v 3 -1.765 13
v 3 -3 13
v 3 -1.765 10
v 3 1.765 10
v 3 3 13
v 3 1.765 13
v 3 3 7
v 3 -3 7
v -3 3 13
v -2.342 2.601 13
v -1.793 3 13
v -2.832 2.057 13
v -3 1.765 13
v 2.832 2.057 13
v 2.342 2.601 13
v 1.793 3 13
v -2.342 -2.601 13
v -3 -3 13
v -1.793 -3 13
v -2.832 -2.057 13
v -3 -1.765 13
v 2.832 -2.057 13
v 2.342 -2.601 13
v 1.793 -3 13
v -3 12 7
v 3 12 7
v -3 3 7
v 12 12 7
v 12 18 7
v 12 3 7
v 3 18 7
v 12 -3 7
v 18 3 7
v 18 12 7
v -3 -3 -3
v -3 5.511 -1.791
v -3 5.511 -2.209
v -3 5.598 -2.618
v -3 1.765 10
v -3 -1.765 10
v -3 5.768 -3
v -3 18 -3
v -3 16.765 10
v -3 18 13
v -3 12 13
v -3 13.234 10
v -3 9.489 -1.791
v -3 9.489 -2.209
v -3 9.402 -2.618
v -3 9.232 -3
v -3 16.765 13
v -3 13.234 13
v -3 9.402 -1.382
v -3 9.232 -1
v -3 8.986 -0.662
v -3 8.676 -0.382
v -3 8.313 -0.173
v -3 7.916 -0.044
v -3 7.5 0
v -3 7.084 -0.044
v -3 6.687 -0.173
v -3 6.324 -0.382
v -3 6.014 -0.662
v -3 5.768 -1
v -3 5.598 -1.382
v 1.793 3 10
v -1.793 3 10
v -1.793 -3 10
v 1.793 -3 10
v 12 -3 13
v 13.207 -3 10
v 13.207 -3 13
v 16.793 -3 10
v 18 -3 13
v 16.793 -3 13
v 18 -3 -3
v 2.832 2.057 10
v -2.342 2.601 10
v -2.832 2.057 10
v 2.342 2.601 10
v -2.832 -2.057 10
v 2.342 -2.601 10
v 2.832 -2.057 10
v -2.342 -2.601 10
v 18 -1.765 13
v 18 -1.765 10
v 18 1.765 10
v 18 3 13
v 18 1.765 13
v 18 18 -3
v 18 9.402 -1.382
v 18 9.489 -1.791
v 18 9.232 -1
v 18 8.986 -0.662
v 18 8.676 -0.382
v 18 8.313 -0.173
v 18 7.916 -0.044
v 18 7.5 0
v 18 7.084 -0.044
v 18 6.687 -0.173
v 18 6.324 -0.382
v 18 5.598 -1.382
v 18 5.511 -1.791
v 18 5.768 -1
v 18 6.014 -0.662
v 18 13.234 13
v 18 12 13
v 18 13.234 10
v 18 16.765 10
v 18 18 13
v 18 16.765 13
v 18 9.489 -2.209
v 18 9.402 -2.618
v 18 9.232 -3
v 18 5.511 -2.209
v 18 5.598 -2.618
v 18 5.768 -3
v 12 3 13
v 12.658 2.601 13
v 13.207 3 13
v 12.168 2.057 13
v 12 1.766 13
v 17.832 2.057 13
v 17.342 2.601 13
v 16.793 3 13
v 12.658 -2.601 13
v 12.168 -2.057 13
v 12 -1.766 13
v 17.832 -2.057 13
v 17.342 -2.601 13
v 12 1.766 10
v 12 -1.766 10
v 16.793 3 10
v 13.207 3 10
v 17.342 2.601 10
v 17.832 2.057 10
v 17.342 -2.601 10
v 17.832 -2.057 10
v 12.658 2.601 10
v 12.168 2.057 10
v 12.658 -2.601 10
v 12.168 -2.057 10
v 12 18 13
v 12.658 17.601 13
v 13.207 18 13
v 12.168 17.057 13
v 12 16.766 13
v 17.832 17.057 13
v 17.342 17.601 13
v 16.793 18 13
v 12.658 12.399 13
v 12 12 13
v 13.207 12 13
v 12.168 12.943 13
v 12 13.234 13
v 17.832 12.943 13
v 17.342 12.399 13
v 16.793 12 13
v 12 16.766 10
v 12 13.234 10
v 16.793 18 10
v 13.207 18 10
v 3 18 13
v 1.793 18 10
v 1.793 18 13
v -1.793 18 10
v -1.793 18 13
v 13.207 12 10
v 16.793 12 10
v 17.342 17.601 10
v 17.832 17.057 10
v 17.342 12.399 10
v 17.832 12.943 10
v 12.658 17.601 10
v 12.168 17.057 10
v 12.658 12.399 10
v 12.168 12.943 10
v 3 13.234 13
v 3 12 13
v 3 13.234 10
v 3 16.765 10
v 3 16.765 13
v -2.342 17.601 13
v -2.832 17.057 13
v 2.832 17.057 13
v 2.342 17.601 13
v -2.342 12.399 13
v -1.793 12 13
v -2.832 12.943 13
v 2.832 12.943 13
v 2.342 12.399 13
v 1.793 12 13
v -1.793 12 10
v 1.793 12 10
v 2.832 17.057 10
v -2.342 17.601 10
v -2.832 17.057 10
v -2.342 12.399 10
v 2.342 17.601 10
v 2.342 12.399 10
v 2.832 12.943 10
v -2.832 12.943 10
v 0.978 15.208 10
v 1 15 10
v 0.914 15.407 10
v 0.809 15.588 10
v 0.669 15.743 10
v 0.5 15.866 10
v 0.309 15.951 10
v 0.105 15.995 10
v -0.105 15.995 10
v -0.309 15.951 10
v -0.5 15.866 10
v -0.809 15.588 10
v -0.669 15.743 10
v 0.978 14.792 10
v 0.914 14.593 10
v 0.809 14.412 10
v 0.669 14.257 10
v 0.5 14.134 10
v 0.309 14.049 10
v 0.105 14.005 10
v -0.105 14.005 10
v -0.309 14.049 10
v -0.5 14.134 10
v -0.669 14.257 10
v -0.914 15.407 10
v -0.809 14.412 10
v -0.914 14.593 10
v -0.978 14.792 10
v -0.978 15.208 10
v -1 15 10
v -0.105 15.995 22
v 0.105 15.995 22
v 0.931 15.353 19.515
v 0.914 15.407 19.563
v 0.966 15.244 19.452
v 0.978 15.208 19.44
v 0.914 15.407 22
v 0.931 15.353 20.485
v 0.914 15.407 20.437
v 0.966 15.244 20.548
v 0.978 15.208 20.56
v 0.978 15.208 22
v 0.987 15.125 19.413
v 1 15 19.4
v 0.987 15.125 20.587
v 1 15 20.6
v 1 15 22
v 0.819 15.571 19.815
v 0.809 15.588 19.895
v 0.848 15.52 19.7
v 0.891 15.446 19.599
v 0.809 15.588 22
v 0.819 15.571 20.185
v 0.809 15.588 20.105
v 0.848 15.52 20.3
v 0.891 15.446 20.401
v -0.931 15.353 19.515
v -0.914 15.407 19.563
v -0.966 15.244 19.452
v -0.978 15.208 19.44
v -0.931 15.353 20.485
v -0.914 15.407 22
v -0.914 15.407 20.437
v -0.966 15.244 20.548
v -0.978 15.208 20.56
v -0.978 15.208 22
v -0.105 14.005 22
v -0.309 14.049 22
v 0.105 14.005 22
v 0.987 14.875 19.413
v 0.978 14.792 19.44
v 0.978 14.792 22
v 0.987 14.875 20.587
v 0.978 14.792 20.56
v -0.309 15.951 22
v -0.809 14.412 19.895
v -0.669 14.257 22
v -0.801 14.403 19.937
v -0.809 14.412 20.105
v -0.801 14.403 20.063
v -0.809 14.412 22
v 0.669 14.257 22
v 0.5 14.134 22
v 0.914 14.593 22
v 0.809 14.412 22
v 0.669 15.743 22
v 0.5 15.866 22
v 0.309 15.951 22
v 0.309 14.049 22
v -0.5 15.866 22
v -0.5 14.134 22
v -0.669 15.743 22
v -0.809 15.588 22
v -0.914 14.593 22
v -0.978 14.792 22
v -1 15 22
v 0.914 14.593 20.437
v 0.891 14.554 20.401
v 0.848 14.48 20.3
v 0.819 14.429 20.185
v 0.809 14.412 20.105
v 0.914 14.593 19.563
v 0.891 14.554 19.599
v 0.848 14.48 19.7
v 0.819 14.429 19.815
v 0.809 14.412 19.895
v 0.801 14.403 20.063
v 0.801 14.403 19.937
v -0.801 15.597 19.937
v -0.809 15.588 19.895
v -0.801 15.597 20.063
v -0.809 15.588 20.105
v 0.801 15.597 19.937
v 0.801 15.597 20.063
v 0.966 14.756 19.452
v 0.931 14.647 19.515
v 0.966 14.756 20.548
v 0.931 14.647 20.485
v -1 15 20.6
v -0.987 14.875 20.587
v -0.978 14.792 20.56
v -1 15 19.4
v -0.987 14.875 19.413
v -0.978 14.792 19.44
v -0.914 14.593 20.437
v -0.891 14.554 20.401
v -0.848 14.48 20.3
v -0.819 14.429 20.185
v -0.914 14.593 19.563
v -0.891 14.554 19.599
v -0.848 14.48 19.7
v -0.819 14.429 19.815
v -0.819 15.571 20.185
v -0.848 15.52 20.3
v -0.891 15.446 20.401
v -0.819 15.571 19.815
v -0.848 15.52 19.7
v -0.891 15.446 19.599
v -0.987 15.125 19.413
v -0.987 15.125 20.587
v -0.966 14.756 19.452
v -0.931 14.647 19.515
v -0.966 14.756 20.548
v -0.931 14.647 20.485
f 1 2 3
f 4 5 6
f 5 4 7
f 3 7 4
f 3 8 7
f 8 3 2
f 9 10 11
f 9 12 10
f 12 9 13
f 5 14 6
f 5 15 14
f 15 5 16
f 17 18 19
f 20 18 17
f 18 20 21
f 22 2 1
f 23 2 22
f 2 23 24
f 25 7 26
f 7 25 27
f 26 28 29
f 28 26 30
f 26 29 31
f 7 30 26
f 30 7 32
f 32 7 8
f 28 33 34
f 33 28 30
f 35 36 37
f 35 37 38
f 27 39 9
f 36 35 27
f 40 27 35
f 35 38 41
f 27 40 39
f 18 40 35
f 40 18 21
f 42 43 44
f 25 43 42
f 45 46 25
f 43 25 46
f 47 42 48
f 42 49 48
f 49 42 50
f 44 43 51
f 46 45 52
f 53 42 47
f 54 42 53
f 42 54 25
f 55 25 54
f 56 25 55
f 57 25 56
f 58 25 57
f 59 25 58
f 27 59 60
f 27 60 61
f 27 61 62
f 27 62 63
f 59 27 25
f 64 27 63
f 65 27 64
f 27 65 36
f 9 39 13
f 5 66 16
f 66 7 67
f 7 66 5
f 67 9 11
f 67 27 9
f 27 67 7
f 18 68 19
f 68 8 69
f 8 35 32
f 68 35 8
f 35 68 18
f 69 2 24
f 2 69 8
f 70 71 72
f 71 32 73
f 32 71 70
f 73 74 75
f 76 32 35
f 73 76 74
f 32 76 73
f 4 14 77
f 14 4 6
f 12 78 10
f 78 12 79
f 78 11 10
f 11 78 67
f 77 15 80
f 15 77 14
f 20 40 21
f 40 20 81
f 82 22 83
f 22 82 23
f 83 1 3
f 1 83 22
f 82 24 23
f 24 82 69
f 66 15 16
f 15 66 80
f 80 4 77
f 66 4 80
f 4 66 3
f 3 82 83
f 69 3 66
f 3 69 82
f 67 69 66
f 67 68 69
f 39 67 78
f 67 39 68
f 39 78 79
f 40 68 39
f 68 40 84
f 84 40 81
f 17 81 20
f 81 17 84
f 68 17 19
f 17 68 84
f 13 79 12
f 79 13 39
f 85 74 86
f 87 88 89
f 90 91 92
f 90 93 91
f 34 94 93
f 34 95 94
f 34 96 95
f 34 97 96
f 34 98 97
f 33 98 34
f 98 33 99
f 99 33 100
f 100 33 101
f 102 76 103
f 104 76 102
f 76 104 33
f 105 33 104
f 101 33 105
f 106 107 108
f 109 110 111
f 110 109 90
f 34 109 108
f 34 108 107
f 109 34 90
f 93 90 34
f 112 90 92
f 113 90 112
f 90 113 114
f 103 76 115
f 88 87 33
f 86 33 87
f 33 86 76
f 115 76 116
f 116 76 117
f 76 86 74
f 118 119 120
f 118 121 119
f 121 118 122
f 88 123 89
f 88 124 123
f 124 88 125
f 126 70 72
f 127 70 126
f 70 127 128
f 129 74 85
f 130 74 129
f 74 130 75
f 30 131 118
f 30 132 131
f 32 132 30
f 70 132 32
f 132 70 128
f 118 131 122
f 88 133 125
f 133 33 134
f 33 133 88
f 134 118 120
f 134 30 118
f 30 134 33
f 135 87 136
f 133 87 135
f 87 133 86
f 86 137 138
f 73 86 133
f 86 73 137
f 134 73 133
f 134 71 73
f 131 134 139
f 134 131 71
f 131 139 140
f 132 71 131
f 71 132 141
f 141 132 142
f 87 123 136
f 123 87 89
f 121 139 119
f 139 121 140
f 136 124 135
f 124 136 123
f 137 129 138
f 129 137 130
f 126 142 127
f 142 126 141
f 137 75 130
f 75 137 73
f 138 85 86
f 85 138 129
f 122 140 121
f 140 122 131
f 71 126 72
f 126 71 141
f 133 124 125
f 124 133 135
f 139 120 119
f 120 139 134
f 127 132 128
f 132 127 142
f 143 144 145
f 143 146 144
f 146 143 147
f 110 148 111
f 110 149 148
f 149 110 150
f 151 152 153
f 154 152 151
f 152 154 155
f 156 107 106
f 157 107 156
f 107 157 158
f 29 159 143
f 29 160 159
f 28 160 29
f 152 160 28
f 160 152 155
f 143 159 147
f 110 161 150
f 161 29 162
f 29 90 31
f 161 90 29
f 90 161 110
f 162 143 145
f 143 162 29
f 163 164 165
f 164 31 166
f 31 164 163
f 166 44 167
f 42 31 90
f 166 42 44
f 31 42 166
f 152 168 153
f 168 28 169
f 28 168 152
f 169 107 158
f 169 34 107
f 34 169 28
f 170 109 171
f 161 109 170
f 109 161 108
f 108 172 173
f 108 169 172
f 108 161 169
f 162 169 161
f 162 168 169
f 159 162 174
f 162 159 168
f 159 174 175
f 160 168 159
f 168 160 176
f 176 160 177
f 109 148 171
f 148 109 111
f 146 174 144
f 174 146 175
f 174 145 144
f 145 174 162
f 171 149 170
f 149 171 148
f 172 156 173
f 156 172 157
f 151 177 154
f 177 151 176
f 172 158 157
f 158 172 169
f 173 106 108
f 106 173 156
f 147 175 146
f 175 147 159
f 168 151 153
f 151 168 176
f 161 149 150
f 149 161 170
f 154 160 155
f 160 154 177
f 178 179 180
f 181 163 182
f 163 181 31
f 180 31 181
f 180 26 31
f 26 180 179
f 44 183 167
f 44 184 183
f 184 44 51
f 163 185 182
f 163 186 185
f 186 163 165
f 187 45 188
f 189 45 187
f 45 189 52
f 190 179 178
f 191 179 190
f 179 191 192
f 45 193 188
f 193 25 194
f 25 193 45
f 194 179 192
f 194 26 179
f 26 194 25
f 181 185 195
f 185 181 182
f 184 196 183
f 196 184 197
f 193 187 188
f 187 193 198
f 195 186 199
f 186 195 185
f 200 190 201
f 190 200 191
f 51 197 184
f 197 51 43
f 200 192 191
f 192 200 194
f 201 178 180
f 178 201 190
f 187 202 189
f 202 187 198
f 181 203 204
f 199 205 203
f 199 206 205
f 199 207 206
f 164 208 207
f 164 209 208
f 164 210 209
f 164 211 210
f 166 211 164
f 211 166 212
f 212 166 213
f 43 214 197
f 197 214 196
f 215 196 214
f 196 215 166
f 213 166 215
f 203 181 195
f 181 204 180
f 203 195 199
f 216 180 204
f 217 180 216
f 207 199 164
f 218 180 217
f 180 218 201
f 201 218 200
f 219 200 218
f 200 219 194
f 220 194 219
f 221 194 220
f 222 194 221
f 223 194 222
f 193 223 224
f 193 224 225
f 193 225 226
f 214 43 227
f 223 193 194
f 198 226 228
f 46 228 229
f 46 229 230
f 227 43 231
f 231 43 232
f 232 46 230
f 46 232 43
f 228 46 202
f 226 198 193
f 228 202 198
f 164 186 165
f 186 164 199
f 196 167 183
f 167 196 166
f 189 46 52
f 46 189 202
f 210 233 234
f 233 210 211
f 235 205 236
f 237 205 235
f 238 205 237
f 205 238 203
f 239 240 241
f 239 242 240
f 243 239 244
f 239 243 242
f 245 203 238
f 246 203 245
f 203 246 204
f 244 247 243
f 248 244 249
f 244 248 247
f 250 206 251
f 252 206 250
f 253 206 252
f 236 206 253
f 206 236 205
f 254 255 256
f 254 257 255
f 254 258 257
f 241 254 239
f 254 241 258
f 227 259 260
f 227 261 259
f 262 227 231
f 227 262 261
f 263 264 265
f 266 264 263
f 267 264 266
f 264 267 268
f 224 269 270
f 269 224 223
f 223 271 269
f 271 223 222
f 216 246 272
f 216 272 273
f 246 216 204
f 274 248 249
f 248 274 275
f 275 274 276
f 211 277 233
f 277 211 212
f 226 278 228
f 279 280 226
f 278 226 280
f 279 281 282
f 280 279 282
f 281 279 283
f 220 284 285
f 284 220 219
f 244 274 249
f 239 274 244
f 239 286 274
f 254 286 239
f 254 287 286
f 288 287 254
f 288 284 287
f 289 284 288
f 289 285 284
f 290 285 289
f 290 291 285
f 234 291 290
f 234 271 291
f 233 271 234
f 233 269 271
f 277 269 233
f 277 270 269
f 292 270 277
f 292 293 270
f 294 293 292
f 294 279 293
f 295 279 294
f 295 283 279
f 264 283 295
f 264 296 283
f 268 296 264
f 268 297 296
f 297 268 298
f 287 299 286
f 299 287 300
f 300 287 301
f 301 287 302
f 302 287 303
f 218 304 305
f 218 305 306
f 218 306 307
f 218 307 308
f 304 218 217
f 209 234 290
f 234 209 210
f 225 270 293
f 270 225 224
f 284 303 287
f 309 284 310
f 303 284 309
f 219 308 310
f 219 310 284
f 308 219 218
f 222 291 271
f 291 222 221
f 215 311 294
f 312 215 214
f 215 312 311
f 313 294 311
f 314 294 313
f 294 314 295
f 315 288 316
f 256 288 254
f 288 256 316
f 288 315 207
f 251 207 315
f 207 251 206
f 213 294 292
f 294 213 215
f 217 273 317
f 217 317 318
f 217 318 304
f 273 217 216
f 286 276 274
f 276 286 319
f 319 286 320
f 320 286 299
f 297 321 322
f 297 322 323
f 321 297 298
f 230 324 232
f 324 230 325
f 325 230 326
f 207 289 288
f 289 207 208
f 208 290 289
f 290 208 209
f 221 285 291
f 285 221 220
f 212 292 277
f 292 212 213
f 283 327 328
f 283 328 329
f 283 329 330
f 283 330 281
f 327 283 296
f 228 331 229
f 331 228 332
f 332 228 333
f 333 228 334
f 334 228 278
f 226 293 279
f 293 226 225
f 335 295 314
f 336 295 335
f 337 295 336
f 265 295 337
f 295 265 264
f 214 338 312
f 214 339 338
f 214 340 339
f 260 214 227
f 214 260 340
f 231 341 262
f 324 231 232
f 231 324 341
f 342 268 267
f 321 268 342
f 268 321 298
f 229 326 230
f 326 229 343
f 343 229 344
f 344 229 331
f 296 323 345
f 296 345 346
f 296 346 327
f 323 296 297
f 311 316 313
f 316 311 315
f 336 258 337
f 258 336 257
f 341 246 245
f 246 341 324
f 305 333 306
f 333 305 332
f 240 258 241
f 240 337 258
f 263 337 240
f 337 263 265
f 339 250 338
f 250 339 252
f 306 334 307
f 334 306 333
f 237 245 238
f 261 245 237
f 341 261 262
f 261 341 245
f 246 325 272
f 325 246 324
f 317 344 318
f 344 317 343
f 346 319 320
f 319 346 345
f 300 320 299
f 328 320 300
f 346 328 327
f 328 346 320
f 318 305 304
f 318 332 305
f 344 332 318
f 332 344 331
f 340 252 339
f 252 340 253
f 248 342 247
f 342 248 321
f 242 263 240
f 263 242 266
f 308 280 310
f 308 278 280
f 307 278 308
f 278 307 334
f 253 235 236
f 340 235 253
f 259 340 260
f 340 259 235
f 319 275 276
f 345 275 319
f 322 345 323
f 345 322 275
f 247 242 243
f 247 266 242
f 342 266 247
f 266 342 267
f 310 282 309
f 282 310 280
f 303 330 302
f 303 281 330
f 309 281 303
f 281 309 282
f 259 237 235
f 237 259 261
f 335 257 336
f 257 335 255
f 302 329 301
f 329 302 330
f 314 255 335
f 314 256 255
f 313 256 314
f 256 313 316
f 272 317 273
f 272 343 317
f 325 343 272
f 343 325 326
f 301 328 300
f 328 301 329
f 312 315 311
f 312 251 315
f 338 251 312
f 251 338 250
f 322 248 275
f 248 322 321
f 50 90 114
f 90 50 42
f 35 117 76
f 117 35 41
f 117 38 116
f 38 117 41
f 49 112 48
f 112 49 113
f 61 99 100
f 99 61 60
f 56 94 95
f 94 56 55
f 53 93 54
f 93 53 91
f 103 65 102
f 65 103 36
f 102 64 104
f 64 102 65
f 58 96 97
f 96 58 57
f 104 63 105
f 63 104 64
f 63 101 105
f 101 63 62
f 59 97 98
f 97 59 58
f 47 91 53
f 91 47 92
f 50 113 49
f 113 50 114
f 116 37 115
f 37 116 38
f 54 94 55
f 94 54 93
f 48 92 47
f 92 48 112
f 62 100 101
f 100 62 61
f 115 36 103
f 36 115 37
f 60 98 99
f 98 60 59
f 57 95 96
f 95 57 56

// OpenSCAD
$fn = 30;


difference(){
    color("green")
    translate([0,0,10])
    cube([6,6,6], center=true);
    translate([0,0,10])
    cylinder(h = 4, r = 3.5);
    }


difference(){
    color("cyan")
    translate([15,0,10])
    cube([6,6,6], center=true);
    translate([15,0,10])
    cylinder(h = 4, r = 3.5);
    }


difference(){
    color("pink")
    translate([15,15,10])
    cube([6,6,6], center=true);
    translate([15,15,10])
    cylinder(h = 4, r = 3.5);
    }
    
difference(){
    color("orange")
    translate([0,15,10])
    cube([6,6,6], center=true);
    translate([0,15,10])
    cylinder(h = 4, r = 3.5);
    }
 
 difference(){
 translate([0,15,10])
 cylinder(h = 12, r = 1);
    
 translate([-5,15, 20])
  rotate([0,90,0])
  cylinder(h= 10, r =0.6);
 }
    
 
 difference(){
translate([7.5,7.5,2])
     color("purple")
 cube([21,21,10], center=true);
    
 
  translate([-5,7.5,-2])
   rotate([0,90,0])
   cylinder(h = 25, r =2 );
    }
